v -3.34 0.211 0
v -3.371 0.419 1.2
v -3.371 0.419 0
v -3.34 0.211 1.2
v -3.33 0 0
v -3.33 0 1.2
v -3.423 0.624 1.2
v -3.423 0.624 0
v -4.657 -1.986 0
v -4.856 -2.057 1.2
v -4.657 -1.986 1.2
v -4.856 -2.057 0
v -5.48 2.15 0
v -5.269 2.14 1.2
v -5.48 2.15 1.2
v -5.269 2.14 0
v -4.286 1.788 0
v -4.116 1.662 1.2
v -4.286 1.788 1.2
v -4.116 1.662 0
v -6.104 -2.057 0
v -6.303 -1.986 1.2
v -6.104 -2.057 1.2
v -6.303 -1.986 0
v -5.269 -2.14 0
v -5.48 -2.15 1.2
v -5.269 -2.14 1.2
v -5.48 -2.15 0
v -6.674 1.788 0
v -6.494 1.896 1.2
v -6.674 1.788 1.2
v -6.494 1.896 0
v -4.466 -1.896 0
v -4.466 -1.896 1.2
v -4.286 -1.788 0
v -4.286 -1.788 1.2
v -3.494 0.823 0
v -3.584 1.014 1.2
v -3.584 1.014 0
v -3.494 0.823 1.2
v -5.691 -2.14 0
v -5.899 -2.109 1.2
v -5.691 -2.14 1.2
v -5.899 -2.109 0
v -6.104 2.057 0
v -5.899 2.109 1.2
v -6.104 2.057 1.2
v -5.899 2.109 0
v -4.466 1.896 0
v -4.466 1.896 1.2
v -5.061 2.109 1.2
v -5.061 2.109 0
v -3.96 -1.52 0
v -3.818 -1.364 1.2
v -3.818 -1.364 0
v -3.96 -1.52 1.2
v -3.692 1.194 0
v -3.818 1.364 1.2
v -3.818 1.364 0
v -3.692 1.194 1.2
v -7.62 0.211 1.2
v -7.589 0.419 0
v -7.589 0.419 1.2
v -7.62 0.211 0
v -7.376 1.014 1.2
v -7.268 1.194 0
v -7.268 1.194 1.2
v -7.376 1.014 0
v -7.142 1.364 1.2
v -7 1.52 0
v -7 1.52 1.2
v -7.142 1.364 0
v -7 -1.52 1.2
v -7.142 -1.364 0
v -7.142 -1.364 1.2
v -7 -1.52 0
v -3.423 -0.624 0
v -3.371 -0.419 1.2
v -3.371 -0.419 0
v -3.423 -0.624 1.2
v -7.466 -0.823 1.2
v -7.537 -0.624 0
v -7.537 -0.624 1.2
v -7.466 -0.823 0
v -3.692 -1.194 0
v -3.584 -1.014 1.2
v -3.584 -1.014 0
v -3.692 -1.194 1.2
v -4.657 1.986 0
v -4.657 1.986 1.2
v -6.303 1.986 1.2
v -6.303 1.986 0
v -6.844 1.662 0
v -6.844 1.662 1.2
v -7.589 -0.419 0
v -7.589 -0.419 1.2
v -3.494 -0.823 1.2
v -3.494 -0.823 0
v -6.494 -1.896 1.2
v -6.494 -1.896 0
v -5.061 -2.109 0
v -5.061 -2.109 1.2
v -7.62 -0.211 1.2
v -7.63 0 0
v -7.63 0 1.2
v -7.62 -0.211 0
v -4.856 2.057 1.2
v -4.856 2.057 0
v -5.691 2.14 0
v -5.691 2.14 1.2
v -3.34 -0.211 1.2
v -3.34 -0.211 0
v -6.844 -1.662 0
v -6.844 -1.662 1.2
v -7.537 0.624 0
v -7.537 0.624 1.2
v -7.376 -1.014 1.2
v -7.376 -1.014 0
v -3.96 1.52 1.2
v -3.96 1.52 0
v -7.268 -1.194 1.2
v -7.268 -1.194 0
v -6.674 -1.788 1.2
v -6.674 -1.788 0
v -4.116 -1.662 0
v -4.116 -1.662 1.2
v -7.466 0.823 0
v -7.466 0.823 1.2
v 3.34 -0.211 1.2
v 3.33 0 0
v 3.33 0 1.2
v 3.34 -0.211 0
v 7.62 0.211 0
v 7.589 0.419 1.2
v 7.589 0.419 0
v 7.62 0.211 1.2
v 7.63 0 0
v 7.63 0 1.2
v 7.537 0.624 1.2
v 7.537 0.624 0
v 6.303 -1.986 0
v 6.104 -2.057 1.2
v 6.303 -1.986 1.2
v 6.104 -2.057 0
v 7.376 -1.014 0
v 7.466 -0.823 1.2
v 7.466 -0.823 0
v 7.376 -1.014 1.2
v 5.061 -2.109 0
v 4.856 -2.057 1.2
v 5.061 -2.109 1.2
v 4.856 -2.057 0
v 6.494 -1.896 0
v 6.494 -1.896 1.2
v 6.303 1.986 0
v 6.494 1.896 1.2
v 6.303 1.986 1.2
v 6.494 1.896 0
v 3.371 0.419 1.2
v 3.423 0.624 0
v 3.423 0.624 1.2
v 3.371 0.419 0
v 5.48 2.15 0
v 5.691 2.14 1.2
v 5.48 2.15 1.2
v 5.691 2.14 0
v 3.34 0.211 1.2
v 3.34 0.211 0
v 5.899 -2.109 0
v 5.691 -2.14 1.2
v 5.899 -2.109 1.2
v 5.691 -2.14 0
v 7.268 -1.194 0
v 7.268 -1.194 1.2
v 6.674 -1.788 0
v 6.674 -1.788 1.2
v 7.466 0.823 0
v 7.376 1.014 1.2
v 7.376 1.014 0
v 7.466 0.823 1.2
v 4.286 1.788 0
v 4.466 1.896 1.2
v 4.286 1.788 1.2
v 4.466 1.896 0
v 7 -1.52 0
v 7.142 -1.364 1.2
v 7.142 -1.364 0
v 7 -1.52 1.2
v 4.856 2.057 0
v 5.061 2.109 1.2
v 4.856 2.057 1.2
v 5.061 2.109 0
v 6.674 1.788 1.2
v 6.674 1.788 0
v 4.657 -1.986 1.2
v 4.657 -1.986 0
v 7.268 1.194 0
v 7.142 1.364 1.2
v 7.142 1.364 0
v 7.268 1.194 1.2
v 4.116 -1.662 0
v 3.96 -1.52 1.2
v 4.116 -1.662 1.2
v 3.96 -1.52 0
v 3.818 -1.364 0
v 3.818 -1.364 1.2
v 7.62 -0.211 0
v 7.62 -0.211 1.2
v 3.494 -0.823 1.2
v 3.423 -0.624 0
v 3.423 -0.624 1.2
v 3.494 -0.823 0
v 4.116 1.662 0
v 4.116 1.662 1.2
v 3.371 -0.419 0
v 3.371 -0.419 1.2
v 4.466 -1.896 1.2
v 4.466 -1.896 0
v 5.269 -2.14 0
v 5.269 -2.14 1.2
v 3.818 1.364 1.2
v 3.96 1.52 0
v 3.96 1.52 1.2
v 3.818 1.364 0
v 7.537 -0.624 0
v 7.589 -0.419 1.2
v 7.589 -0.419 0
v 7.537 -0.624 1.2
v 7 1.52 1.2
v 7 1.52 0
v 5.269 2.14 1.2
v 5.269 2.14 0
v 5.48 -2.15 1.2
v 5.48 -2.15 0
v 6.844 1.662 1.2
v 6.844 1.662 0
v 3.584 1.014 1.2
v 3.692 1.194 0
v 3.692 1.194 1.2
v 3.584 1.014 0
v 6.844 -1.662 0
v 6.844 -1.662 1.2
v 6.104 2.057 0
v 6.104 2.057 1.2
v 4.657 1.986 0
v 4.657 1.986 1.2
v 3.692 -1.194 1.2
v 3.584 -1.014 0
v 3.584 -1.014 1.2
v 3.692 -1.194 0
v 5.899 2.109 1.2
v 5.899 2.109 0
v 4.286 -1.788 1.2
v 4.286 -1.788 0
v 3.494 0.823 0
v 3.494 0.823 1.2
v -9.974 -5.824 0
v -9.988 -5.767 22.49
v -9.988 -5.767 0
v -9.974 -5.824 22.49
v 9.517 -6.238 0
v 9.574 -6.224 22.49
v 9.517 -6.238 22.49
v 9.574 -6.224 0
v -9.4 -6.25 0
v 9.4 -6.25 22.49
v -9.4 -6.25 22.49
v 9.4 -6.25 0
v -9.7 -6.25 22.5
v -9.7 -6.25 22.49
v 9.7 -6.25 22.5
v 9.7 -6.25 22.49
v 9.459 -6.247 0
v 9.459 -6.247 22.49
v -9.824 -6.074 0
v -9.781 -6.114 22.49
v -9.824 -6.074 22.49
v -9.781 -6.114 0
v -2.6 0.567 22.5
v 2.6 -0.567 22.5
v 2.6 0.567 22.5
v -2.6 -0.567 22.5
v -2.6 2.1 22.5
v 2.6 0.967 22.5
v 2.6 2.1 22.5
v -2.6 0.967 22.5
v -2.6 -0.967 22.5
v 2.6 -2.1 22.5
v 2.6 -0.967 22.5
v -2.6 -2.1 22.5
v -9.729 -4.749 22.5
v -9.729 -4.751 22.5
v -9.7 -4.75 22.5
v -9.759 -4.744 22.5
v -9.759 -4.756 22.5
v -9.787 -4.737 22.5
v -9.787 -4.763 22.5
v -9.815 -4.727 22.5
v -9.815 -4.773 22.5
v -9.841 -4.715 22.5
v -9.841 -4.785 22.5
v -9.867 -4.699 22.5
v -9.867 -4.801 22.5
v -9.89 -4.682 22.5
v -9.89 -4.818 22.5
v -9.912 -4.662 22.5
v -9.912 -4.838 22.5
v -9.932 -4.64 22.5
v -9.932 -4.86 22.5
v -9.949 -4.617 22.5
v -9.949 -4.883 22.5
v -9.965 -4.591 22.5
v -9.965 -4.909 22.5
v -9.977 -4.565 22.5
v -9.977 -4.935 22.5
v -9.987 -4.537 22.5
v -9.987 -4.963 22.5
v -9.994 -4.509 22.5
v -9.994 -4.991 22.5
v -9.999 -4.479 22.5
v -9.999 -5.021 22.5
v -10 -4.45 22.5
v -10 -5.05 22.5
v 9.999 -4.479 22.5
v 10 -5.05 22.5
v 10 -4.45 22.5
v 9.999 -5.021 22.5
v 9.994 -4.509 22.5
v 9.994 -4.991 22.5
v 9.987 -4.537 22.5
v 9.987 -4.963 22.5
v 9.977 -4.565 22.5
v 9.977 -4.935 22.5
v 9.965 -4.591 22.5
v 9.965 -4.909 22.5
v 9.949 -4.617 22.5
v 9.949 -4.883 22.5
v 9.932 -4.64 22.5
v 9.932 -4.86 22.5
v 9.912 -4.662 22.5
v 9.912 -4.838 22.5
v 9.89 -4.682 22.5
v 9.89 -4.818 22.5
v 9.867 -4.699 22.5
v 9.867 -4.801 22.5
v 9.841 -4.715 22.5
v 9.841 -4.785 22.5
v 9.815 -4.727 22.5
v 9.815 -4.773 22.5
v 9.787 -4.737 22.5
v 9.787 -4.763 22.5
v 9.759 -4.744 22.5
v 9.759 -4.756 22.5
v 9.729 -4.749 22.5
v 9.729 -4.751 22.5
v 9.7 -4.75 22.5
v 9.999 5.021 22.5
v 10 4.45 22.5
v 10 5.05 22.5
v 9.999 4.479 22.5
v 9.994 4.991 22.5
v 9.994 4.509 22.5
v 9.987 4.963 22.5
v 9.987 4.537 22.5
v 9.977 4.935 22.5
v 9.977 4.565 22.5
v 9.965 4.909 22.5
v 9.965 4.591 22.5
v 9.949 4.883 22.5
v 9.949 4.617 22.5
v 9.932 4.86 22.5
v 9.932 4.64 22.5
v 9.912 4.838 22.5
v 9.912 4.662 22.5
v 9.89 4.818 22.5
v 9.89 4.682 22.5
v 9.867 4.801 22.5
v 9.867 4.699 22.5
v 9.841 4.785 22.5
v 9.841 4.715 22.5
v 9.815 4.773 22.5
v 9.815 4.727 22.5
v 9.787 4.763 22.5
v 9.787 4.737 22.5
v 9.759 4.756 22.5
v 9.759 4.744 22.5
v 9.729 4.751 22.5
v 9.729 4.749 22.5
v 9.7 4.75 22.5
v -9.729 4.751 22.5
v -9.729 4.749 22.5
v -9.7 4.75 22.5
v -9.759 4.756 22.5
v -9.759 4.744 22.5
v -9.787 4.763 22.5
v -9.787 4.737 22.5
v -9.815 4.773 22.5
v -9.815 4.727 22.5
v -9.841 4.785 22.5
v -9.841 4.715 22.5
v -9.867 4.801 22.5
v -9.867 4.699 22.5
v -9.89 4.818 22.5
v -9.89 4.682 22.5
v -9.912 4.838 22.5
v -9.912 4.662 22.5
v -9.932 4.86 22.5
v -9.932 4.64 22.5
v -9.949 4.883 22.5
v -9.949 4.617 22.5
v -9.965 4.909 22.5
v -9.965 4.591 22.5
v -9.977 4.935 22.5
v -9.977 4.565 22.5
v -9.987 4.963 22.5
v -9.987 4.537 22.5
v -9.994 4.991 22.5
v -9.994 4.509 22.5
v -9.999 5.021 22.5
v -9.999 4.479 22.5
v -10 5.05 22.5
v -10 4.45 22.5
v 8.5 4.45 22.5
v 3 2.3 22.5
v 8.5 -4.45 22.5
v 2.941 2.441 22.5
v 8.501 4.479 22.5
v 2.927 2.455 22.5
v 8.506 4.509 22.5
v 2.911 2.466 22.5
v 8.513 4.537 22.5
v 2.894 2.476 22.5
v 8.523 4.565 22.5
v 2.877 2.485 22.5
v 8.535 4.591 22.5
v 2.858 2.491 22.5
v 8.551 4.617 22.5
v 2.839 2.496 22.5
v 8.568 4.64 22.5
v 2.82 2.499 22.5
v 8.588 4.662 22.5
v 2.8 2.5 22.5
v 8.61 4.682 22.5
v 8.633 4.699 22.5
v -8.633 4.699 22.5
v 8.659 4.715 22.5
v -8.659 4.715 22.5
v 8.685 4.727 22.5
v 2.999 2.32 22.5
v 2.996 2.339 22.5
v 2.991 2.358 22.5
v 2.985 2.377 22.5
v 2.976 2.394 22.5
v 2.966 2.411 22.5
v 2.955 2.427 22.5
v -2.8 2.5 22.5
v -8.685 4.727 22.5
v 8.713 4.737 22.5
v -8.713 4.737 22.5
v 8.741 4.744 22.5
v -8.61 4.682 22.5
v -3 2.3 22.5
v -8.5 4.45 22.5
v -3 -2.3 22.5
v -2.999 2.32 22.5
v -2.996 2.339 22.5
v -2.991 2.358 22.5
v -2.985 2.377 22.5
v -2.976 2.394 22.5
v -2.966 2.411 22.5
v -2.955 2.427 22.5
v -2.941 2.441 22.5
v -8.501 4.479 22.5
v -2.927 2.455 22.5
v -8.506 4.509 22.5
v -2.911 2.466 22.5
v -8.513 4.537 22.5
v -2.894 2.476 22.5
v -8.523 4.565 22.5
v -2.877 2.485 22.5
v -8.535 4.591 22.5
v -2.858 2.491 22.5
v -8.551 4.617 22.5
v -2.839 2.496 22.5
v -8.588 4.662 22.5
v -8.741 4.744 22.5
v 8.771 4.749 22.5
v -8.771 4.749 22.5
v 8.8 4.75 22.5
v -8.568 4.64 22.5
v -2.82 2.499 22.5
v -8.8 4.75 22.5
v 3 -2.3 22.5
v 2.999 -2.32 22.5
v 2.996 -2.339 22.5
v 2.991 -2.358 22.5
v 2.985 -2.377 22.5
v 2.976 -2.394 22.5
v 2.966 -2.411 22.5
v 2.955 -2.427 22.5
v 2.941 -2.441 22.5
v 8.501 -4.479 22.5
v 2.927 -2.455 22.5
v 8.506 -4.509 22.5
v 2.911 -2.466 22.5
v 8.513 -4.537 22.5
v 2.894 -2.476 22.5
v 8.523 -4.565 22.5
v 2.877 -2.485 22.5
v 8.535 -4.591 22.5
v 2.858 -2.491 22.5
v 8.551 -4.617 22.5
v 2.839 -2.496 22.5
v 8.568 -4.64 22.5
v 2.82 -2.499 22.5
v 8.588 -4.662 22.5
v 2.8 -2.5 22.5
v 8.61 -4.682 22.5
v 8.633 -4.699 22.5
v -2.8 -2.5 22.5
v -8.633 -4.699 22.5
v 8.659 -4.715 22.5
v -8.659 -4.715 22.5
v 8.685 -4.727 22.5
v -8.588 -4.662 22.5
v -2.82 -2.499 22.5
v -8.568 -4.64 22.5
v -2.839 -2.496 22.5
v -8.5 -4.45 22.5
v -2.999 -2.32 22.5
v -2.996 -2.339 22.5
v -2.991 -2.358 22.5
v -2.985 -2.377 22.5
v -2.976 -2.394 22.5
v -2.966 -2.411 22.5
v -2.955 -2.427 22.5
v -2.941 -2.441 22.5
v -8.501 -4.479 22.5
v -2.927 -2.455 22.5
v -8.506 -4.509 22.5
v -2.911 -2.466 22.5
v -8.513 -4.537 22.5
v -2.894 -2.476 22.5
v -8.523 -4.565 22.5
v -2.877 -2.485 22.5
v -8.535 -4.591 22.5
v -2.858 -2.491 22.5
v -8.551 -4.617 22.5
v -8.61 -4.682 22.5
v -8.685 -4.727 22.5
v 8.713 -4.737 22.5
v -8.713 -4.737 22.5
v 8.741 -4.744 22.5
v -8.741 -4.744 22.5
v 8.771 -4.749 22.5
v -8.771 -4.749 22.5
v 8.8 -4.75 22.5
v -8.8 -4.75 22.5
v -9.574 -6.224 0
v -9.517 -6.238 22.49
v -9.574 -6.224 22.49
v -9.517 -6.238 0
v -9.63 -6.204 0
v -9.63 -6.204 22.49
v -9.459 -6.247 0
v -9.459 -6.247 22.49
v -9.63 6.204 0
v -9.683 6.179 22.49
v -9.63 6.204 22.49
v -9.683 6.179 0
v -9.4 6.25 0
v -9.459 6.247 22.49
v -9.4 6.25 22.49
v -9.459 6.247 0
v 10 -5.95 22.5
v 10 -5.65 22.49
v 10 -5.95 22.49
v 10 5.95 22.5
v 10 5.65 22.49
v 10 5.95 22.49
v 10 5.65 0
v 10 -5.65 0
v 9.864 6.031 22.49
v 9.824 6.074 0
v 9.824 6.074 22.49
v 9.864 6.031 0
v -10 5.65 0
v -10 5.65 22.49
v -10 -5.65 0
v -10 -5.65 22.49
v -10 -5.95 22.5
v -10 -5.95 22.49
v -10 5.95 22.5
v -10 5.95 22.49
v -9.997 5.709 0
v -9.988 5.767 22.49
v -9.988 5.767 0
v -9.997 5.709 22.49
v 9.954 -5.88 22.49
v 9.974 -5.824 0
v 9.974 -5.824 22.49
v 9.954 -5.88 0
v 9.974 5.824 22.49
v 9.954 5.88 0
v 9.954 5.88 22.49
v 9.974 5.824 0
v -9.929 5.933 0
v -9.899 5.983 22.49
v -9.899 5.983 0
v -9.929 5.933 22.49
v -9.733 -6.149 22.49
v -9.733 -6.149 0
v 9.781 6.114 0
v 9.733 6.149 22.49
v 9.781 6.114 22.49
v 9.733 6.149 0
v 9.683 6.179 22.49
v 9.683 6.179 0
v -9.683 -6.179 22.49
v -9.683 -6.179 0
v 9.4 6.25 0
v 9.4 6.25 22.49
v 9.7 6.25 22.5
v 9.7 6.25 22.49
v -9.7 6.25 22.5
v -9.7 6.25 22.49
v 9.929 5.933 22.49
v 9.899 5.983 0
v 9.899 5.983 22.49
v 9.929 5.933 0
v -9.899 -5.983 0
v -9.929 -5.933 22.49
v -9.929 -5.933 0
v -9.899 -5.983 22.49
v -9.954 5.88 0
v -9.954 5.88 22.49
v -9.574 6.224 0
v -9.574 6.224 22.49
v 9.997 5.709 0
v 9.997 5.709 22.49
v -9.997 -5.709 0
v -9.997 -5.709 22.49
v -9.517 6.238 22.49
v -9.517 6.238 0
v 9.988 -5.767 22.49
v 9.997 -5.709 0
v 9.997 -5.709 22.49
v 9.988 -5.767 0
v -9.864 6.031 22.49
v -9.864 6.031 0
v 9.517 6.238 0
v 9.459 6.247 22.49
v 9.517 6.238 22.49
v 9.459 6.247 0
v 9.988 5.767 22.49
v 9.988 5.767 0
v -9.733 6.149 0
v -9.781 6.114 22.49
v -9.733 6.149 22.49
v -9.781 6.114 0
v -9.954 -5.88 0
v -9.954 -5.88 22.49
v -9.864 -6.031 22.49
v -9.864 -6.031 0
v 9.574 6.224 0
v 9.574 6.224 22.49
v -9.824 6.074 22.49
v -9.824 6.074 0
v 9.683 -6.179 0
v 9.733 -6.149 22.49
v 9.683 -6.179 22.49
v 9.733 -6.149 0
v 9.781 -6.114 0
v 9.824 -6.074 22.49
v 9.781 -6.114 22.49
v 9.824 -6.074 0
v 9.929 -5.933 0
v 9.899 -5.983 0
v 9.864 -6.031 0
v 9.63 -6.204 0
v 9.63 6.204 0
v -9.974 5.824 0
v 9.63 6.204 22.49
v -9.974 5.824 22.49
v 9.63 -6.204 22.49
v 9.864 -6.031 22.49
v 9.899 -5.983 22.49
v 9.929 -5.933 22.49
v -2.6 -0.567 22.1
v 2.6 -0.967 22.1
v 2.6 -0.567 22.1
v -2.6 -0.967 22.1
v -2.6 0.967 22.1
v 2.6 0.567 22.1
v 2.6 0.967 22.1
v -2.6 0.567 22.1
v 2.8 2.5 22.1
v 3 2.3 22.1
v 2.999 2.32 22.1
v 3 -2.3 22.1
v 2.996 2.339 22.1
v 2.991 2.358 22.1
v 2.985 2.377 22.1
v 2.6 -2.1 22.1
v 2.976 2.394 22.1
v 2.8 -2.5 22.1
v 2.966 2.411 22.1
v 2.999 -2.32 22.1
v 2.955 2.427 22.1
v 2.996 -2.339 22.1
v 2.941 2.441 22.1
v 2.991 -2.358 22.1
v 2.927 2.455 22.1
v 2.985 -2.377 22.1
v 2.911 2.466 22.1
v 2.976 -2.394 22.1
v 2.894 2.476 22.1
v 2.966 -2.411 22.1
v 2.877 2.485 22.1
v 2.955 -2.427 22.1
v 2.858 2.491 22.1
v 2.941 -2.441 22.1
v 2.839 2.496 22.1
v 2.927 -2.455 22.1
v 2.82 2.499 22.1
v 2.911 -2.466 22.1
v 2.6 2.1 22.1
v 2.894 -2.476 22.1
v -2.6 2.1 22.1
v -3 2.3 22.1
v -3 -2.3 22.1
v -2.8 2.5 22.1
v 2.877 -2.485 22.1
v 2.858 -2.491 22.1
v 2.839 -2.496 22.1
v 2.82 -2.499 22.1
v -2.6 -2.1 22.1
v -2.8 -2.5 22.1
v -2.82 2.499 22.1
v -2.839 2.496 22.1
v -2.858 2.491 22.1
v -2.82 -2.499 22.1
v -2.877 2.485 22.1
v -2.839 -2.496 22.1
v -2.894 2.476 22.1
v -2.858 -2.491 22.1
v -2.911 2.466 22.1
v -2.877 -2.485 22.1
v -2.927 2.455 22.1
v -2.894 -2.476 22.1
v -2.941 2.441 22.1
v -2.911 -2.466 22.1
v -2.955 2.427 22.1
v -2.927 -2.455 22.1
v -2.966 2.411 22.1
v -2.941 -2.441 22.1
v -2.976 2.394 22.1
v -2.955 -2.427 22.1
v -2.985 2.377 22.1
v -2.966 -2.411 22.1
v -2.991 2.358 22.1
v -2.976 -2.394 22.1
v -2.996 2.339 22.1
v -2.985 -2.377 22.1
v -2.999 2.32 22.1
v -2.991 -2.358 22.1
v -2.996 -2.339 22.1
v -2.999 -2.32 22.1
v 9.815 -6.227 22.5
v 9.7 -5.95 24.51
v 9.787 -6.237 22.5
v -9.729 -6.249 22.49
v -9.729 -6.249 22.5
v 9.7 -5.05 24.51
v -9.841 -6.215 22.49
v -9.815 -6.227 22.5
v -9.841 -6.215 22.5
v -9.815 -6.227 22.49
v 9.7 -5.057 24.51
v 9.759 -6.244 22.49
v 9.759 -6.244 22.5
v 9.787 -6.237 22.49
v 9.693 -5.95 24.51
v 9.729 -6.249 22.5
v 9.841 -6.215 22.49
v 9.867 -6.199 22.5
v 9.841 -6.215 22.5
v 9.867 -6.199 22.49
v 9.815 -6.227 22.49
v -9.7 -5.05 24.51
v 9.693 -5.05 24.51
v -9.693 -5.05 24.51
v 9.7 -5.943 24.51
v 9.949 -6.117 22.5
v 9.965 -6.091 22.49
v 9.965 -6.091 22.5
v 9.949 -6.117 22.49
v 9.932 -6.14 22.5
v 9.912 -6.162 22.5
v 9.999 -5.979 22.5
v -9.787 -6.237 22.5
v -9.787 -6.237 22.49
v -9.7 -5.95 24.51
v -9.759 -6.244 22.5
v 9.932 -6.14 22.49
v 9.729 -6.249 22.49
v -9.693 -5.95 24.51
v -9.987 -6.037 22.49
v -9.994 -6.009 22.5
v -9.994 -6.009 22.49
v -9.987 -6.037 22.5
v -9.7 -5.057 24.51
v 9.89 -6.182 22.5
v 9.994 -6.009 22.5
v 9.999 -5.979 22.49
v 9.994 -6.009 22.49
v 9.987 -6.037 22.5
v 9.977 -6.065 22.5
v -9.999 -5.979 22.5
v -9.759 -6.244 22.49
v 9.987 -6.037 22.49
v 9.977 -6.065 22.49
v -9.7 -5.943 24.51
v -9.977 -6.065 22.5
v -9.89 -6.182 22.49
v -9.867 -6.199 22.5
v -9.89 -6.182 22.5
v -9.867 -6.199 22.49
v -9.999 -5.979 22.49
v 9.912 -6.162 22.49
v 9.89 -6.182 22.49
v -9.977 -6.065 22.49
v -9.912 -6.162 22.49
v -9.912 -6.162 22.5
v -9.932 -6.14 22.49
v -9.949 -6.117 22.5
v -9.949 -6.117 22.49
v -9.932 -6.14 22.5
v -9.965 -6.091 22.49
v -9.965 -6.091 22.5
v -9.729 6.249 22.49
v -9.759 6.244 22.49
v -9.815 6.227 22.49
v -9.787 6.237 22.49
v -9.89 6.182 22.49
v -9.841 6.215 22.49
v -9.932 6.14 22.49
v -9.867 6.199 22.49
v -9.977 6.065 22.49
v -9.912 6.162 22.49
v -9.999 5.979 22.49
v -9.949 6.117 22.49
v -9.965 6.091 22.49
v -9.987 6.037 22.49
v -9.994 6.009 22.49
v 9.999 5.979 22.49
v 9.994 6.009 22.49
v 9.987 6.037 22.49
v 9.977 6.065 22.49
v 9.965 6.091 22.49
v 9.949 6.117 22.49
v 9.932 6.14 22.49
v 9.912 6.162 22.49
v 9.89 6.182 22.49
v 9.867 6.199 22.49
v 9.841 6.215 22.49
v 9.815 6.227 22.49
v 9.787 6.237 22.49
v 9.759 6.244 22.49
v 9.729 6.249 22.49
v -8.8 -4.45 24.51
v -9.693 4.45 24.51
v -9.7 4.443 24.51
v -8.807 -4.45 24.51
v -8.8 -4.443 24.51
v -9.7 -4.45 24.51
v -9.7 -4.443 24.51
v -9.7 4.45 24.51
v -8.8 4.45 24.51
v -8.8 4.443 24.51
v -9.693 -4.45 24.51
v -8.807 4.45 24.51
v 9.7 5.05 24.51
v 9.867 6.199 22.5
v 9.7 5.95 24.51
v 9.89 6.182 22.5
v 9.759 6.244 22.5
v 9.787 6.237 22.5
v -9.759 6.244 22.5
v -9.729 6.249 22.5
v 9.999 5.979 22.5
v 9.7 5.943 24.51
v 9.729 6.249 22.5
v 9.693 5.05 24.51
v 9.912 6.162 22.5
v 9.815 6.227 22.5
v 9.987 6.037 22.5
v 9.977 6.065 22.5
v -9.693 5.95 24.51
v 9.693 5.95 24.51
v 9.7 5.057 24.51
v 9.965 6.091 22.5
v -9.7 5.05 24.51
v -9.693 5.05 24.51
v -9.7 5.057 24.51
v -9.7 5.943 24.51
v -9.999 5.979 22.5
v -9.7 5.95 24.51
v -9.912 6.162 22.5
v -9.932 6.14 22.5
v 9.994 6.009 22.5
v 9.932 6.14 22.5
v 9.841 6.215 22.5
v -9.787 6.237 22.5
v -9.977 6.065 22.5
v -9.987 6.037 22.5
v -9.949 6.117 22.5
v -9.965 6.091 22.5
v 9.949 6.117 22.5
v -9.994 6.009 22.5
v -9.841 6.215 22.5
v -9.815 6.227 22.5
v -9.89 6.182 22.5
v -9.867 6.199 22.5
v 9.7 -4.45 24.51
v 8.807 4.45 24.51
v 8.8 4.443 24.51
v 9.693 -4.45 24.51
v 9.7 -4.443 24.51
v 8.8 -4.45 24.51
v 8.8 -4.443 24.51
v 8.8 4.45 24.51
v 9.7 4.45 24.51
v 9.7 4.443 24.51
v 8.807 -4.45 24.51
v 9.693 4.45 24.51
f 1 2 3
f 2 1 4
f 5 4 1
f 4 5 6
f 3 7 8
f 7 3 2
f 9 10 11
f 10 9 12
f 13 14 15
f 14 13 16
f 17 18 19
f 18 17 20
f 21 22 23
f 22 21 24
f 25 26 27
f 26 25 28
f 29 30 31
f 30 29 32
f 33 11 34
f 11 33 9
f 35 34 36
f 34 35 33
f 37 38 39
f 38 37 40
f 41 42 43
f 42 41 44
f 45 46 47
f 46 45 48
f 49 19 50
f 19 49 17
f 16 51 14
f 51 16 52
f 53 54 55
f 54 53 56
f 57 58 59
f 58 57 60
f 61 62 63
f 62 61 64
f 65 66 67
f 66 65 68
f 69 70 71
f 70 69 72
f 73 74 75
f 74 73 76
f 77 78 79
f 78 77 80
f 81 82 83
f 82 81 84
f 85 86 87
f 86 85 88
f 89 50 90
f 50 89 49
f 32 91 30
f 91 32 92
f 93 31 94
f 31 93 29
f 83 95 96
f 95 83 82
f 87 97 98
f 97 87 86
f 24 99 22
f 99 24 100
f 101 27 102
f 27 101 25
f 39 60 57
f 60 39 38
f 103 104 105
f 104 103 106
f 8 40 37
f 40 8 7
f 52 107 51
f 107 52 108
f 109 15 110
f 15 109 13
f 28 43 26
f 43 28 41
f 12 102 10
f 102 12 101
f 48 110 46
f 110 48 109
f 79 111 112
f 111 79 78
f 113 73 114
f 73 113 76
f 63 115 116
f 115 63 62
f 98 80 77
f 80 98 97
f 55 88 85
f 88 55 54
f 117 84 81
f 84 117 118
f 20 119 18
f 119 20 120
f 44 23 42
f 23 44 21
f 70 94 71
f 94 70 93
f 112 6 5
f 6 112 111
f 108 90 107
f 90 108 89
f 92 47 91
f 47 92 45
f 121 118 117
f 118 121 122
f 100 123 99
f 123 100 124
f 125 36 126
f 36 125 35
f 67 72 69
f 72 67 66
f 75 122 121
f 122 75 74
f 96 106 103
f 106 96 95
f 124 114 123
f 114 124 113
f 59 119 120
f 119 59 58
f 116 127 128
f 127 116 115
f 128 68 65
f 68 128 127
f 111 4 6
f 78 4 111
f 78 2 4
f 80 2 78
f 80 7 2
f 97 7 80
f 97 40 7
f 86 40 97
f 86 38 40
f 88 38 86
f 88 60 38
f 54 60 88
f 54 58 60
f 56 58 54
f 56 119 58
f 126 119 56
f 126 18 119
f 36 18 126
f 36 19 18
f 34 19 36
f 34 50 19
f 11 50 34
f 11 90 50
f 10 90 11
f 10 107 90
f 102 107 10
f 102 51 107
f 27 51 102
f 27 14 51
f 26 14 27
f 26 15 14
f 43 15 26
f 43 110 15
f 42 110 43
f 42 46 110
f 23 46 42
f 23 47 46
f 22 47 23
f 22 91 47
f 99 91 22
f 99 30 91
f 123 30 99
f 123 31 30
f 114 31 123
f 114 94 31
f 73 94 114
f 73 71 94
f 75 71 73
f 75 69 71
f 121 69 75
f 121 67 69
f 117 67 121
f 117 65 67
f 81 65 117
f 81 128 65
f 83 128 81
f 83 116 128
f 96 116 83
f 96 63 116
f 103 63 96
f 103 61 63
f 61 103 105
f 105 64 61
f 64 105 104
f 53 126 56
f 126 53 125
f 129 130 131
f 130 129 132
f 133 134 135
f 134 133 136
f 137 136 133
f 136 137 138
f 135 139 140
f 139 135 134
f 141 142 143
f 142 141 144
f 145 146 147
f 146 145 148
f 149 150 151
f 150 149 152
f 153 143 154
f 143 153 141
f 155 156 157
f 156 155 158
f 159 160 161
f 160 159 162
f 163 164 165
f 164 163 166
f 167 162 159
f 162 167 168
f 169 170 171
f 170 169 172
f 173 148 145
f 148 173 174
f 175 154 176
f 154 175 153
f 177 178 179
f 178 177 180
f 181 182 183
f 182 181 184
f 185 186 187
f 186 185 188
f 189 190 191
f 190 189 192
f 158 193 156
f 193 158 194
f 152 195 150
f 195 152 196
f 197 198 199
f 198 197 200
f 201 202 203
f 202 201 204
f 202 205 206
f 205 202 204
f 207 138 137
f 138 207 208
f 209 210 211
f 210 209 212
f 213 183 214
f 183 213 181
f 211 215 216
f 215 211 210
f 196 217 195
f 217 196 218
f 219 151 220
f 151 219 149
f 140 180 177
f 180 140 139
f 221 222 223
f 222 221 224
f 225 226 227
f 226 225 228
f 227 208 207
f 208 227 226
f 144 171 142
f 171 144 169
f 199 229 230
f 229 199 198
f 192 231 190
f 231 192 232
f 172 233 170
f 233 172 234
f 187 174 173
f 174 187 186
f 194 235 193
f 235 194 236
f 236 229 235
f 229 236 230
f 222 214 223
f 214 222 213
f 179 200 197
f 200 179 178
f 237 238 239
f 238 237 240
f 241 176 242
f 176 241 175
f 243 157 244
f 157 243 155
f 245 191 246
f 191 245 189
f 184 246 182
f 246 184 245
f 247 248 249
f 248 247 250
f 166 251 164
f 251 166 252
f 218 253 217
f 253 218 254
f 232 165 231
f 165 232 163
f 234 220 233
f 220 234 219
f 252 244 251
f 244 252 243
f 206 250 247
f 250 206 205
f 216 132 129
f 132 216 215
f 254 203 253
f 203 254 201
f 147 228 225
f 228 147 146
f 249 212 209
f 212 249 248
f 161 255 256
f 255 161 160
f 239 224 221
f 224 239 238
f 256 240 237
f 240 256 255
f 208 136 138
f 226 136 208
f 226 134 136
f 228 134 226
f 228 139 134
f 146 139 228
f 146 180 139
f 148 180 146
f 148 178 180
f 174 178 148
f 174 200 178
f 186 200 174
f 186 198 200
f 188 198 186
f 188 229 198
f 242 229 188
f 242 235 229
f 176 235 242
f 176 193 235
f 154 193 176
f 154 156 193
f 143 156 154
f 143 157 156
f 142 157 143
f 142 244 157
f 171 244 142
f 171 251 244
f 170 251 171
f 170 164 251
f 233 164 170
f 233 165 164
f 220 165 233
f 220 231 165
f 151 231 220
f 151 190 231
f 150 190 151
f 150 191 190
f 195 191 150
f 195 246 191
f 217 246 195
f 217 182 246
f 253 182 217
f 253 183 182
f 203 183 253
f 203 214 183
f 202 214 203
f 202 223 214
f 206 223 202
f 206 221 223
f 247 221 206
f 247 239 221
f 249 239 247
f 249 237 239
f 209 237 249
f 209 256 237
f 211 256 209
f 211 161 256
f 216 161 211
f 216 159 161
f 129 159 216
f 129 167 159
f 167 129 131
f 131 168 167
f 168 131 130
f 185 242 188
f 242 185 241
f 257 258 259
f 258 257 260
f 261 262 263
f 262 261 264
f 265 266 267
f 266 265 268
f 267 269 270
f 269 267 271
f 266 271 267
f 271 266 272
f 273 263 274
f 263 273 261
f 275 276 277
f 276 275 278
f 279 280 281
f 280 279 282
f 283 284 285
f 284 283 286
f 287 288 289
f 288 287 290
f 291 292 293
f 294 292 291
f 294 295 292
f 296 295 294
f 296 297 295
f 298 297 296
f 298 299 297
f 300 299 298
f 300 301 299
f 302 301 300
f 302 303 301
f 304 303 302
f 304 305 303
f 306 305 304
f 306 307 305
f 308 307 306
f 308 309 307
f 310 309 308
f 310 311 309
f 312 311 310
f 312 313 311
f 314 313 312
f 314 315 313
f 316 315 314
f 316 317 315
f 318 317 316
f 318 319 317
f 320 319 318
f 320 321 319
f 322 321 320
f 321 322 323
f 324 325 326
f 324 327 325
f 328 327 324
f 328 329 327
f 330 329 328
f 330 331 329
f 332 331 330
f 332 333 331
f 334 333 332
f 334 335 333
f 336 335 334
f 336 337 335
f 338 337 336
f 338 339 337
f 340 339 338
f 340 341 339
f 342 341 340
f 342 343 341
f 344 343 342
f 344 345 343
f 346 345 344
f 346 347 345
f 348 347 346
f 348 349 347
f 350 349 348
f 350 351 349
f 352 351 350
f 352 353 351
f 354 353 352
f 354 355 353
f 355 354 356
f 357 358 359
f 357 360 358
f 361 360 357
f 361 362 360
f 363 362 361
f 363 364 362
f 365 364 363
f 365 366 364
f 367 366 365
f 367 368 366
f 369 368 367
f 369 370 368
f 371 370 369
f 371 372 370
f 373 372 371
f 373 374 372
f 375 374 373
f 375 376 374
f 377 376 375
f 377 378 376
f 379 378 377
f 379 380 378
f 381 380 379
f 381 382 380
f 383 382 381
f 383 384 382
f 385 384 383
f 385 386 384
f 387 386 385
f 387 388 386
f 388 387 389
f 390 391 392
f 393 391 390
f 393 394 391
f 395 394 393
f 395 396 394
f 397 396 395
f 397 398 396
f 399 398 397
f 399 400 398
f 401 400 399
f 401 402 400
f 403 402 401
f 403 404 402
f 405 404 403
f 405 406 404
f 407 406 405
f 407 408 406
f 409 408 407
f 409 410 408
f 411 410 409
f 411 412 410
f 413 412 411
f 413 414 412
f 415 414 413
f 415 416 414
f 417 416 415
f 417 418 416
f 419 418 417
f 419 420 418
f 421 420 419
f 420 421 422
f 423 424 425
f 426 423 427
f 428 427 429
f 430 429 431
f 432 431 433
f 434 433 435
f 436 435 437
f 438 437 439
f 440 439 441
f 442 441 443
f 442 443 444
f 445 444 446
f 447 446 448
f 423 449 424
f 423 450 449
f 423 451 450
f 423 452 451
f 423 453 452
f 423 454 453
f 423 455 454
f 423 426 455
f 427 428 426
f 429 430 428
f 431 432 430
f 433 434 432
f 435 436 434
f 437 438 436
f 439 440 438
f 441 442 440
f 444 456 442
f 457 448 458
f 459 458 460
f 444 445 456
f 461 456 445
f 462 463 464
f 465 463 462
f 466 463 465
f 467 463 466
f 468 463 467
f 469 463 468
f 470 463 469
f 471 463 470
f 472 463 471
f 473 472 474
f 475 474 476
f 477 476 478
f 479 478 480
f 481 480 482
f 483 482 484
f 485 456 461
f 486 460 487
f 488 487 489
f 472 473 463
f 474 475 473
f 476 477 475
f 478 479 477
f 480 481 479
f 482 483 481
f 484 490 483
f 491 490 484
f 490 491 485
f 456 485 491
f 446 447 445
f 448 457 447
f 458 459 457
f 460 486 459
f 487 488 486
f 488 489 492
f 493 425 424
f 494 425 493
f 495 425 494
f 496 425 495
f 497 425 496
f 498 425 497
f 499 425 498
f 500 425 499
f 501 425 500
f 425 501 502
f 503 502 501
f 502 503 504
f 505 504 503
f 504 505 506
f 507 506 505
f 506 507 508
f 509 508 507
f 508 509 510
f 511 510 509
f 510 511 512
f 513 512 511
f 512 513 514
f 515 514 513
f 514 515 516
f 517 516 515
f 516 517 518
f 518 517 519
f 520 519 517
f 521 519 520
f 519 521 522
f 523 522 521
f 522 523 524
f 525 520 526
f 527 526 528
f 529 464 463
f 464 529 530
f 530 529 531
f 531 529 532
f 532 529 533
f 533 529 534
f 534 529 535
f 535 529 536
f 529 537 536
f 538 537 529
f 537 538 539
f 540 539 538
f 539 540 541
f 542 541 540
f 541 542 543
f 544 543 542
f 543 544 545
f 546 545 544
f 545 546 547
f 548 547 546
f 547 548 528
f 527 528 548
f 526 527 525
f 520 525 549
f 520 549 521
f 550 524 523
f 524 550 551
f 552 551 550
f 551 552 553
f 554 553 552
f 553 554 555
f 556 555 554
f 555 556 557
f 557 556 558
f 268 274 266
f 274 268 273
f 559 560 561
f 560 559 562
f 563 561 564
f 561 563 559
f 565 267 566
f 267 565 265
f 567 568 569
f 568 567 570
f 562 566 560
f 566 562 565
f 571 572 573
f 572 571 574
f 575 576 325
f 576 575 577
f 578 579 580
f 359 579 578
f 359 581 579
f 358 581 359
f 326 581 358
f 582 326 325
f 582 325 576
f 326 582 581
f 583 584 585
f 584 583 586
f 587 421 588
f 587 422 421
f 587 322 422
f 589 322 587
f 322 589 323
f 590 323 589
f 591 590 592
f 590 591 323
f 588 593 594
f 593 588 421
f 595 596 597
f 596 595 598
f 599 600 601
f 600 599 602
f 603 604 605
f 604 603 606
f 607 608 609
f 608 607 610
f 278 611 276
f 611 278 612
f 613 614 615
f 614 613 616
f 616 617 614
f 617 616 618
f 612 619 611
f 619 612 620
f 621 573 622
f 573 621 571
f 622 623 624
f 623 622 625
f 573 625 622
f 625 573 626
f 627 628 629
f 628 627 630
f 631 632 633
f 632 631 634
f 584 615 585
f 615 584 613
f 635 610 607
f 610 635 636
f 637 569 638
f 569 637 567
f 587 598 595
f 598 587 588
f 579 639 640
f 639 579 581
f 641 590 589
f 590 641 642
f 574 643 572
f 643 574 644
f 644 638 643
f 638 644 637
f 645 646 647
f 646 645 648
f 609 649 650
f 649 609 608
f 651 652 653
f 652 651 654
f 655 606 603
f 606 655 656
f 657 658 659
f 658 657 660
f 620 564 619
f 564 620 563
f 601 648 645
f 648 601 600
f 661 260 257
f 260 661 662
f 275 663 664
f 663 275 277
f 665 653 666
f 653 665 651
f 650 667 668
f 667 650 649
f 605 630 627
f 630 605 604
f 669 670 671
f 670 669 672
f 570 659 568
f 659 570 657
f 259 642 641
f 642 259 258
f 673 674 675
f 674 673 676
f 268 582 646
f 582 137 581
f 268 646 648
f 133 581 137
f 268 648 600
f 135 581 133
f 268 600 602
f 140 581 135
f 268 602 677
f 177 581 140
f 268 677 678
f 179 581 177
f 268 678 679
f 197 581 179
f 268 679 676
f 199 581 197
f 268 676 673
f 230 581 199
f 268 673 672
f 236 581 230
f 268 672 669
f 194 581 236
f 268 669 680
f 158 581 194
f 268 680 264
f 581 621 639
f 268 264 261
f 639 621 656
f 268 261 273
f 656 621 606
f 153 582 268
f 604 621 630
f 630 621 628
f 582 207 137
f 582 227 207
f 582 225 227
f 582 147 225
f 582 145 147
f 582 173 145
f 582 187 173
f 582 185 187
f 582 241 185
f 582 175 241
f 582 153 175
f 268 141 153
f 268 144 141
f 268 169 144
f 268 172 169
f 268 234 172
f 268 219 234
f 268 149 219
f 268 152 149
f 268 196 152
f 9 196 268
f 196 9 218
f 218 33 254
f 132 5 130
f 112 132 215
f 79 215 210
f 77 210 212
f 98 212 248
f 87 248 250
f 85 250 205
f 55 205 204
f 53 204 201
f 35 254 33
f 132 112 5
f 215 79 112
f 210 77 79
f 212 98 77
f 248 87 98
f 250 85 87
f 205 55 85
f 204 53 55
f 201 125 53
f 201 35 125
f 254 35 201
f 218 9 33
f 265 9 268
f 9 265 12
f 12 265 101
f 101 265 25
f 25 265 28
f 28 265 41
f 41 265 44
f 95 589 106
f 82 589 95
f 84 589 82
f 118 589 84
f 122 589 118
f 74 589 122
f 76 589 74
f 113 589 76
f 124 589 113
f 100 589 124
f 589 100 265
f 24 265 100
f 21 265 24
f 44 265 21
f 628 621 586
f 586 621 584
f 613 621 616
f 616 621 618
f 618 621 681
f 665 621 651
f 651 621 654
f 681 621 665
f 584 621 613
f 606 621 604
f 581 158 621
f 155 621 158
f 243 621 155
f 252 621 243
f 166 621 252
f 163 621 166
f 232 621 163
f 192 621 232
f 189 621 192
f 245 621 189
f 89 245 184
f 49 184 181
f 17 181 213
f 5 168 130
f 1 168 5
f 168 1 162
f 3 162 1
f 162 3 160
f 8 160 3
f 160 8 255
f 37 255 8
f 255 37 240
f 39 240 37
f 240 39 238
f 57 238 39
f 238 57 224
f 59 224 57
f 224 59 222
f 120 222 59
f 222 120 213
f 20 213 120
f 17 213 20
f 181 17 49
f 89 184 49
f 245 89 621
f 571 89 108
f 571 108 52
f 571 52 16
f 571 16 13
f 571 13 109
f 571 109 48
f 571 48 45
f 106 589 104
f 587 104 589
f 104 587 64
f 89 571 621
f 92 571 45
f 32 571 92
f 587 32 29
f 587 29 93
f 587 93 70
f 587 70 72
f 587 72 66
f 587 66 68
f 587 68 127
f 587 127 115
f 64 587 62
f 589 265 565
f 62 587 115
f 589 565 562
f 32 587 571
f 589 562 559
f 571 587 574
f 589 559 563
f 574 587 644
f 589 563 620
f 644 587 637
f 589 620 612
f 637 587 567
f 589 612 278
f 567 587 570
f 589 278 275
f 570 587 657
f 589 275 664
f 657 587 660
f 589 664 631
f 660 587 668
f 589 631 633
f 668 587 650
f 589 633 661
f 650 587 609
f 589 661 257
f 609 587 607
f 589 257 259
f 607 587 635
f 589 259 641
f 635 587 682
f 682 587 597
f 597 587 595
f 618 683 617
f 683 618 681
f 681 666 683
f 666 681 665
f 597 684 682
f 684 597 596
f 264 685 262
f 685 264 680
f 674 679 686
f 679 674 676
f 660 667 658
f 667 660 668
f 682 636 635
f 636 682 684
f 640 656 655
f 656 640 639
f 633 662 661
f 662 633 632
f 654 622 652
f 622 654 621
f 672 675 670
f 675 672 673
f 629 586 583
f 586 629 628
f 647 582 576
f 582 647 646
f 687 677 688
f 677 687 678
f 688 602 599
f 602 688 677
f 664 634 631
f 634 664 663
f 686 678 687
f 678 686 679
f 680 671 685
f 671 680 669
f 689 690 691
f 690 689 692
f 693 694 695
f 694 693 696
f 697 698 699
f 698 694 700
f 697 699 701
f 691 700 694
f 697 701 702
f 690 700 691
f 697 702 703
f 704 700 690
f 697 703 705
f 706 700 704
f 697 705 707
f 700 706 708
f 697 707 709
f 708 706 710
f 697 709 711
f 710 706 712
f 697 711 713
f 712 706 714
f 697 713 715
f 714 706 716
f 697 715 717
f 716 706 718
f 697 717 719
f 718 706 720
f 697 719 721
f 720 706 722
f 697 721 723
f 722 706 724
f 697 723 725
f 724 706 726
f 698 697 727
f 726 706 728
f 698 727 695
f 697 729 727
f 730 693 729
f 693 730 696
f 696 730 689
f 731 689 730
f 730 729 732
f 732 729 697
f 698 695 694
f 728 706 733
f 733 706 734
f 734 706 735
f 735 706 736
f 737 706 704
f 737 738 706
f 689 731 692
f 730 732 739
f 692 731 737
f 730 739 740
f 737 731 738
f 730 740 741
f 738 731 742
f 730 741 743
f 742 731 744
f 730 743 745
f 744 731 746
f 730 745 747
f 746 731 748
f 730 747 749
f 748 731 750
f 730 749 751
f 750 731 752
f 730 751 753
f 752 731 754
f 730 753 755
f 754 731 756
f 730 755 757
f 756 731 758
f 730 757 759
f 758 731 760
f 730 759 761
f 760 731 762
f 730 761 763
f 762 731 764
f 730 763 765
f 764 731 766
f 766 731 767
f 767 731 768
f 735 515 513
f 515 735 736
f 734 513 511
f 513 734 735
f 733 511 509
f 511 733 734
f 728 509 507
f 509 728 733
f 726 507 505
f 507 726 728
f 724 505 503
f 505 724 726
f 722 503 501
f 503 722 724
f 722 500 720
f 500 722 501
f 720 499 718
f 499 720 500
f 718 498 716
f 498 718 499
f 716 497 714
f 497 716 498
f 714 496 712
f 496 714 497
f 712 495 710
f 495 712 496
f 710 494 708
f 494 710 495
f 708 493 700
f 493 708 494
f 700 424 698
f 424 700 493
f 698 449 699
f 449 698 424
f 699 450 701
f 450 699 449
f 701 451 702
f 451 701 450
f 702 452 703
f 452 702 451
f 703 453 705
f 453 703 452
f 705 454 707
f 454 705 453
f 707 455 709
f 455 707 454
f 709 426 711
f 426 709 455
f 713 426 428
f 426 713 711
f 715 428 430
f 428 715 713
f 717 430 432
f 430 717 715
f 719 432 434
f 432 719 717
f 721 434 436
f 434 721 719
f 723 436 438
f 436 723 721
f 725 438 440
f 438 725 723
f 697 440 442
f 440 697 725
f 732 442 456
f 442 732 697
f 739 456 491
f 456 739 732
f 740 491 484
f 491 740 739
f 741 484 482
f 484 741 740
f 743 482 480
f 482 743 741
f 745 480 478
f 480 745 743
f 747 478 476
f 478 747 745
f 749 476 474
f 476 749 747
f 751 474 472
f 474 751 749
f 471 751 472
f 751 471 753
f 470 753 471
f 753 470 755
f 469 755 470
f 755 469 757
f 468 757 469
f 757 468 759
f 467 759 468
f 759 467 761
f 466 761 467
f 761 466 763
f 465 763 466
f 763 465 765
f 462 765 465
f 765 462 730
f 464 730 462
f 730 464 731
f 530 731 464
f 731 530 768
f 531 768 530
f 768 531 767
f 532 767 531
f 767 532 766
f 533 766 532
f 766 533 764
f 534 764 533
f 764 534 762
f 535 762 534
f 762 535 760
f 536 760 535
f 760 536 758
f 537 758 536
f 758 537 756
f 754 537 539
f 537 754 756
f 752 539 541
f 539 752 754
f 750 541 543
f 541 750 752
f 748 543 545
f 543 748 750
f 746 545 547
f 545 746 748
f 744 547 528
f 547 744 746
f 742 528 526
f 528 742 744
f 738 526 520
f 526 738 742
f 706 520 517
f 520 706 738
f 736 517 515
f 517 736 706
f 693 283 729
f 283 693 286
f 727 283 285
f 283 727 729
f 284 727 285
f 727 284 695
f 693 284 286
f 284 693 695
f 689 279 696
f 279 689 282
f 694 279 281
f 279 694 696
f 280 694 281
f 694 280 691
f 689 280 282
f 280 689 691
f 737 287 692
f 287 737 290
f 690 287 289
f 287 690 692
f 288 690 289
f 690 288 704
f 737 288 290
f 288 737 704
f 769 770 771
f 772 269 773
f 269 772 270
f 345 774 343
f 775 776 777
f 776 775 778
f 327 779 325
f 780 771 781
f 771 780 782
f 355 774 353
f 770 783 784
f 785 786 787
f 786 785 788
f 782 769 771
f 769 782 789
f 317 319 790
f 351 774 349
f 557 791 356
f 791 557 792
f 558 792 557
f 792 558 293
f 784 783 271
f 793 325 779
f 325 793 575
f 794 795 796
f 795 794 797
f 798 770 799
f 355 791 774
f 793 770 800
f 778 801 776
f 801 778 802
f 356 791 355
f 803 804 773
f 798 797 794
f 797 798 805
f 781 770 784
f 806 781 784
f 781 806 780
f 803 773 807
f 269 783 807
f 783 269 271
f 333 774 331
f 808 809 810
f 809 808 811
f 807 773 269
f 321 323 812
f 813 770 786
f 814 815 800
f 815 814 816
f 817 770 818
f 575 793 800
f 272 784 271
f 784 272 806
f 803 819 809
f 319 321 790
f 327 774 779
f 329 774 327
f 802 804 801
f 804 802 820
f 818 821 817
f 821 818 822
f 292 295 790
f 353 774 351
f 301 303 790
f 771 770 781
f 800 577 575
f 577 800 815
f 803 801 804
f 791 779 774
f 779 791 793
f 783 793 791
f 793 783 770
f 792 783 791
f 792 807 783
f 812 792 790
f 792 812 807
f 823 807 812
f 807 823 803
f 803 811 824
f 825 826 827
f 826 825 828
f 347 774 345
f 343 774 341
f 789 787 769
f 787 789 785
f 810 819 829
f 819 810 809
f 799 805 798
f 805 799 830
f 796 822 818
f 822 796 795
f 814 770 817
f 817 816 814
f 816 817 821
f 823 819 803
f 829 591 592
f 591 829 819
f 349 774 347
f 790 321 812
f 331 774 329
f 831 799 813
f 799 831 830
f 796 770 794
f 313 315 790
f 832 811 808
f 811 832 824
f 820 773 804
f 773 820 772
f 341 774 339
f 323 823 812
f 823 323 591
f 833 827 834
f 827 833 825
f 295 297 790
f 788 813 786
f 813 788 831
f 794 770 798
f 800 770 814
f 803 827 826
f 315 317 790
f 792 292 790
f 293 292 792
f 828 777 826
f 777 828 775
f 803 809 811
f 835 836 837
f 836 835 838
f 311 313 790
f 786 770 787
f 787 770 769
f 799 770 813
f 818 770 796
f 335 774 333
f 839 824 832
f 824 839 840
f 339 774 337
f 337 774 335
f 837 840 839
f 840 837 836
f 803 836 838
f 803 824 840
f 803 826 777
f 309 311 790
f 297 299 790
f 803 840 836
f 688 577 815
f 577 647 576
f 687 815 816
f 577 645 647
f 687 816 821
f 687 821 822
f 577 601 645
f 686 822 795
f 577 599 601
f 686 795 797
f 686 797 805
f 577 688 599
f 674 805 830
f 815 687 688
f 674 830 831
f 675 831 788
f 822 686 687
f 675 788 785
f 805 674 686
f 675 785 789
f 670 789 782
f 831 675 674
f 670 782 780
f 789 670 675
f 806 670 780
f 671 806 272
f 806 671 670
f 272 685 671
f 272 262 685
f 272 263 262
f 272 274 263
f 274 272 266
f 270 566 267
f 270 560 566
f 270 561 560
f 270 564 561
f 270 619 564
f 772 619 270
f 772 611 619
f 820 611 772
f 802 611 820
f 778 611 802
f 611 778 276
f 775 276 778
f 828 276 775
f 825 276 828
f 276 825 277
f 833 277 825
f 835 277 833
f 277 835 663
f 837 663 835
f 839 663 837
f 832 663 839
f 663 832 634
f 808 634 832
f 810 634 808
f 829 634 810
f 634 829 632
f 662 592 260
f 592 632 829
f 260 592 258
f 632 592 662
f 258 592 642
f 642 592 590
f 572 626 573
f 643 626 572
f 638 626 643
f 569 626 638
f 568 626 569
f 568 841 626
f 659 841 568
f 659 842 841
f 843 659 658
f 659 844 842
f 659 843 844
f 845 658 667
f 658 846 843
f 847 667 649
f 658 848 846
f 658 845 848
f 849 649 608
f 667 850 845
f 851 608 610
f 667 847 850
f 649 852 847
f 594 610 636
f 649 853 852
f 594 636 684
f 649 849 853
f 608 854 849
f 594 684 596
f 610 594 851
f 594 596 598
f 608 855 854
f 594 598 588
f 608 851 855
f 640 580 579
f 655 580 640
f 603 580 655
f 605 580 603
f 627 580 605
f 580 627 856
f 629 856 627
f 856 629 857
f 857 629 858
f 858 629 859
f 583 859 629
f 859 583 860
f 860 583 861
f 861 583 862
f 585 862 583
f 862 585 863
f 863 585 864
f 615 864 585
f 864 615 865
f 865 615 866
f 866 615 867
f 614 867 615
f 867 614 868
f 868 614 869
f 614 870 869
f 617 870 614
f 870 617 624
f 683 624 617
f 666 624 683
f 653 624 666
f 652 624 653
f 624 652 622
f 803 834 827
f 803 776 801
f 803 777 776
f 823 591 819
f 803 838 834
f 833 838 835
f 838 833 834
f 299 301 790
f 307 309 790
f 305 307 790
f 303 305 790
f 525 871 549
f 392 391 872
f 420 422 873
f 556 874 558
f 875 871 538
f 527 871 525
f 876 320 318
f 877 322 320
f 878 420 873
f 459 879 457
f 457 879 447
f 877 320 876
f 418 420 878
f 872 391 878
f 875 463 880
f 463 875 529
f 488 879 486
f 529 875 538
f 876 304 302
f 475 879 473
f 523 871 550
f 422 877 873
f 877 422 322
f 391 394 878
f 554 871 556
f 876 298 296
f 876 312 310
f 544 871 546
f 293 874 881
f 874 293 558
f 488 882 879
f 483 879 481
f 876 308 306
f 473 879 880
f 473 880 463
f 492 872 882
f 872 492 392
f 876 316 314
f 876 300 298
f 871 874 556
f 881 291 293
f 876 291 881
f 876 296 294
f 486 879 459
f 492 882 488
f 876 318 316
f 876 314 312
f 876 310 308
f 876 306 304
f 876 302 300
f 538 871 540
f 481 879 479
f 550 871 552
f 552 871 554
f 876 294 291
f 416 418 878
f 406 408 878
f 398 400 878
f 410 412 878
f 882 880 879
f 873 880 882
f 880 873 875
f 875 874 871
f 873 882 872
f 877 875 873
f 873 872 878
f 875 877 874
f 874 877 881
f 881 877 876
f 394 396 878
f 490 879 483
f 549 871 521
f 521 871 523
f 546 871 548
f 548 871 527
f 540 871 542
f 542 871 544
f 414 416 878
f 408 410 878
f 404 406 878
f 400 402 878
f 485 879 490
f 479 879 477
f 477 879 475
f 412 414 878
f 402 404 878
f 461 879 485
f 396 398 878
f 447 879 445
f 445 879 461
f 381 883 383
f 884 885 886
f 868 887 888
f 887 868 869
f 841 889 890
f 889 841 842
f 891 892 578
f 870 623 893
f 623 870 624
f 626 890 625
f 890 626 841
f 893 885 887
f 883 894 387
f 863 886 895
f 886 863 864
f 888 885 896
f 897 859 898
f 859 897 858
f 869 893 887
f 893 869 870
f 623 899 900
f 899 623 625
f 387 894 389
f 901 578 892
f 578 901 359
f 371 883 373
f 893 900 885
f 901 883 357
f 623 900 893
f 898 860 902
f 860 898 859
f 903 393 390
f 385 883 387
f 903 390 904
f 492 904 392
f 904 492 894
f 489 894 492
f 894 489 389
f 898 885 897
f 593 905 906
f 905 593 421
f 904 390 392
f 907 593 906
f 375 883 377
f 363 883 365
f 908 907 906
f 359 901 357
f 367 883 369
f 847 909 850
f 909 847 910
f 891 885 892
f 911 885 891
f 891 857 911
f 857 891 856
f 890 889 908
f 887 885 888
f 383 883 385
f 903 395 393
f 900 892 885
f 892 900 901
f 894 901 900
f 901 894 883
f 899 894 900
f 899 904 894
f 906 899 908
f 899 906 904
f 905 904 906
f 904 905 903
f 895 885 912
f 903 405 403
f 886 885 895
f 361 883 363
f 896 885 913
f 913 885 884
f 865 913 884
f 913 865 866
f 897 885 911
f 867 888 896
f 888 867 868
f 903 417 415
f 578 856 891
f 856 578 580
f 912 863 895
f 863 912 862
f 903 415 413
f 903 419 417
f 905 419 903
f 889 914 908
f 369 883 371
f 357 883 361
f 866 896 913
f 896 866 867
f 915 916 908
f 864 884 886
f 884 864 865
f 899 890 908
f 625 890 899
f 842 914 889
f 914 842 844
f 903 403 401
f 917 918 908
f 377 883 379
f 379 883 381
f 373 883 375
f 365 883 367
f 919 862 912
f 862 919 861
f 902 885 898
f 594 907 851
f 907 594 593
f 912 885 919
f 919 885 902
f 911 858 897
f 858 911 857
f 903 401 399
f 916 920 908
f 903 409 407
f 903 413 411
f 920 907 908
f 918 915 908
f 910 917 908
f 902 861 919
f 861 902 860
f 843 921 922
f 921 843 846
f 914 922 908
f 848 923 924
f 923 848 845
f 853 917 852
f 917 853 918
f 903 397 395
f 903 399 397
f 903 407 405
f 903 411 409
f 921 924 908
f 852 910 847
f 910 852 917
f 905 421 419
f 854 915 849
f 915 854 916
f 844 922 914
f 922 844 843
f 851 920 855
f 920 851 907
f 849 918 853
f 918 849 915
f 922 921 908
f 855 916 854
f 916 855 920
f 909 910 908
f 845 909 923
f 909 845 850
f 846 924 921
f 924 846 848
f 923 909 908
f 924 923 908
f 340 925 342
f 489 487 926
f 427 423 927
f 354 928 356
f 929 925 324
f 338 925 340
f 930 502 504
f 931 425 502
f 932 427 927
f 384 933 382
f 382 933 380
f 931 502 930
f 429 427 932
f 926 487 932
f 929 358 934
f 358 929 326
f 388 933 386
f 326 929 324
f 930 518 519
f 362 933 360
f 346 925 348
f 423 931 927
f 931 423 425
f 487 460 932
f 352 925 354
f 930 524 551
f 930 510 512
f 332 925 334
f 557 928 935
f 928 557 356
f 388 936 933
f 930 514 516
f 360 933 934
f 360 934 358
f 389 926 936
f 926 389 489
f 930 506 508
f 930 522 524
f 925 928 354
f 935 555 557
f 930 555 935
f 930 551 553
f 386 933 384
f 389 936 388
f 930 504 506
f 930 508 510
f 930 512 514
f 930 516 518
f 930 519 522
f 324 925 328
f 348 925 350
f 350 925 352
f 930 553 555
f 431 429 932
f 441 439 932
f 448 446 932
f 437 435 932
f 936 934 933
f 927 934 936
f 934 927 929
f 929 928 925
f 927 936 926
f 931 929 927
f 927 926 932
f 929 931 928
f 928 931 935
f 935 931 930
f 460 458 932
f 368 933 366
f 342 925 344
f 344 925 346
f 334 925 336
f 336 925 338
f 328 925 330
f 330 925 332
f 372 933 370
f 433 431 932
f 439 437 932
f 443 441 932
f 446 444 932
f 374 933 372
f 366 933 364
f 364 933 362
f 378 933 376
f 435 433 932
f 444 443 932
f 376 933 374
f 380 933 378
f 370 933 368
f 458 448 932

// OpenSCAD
// kidsroom / changing_table — a baby changing table token: drawer fronts
// engraved on top, plus a low raised guard rim around the top edge so the
// piece reads as somewhere a baby is kept from rolling off.
//
// Width/Depth are the real-world footprint in cm (a changing table is close
// to a chest of drawers in size: about 80 wide, 50 deep). Height is the real height
// of the changing surface — waist height, so a baby can be reached without
// stooping — shrunk by the plan scale like the footprint (see printed_h() in
// lib/common.scad); the guard rim stands its own real height on top of that.

include <../lib/common.scad>

Width  = 80;  // cm
Depth  = 50;  // cm
Height = 90;  // cm — the changing surface

// the printed height, mm: Height at the plan scale
Print_h = printed_h(Height);

Show_drawers = true;
Show_rim     = true;
// The guard rim: how far in from the edge the raised band reaches, in real
// cm, and how it is built. It reuses cushion()'s self-tapering hull — sides
// slope, so it prints without support, unlike a thin tall wall — but with a
// smaller radius/taper than the Cushion_* defaults, which are sized for a
// full pillow and would collapse a band this narrow to nothing.
Rim_w      = 6;    // cm
Rim_h      = 8;    // cm the rim stands above the surface
Rim_taper  = 0.3;  // mm
Rim_radius = 0.3;  // mm
// Magnet pockets in the bottom face, in a row along the width (0 = none).
// Two keep the piece from pivoting; the 50 cm depth is still 12.5 mm at 1:40,
// wide enough for the 4 mm disc; see Magnet_* in lib/common.scad.
Magnets = 2;

changing_table();

module changing_table() {
    // with the rim up, keep the drawers inside the well it leaves; with it
    // off, let the drawers use the whole top face, as in ikea_hemnes.scad
    patch_w = Show_rim ? cm(Width - 2 * Rim_w) - 2 * Symbol_margin
                        : cm(Width) - 2 * Symbol_margin;
    patch_h = Show_rim ? cm(Depth - 2 * Rim_w) - 2 * Symbol_margin
                        : cm(Depth) - 2 * Symbol_margin;
    union() {
        difference() {
            footprint(Width, Depth, Print_h);
            if (Show_drawers)
                drawers(drawers_size(patch_w, patch_h), Print_h);
            if (Magnets > 0)
                magnets(Width, Depth, Magnets);
        }
        if (Show_rim) guard_rim();
    }
}

// The guard rim: four cushion()-style pads butted at the corners — two
// full-width bars along the front/back edges and two shorter bars along the
// sides, tiling a shallow raised frame around the top. Each pad is its own
// low, self-tapering hull (see cushion() in lib/common.scad), so the frame
// prints flat with no support, unlike a thin tall wall.
module guard_rim() {
    for (s = [-1, 1]) {
        translate([0, s * cm(Depth - Rim_w) / 2, 0])
            cushion(Width, Rim_w, Print_h, Rim_h, Rim_taper, Rim_radius);
        translate([s * cm(Width - Rim_w) / 2, 0, 0])
            cushion(Rim_w, Depth - 2 * Rim_w, Print_h, Rim_h, Rim_taper, Rim_radius);
    }
}
